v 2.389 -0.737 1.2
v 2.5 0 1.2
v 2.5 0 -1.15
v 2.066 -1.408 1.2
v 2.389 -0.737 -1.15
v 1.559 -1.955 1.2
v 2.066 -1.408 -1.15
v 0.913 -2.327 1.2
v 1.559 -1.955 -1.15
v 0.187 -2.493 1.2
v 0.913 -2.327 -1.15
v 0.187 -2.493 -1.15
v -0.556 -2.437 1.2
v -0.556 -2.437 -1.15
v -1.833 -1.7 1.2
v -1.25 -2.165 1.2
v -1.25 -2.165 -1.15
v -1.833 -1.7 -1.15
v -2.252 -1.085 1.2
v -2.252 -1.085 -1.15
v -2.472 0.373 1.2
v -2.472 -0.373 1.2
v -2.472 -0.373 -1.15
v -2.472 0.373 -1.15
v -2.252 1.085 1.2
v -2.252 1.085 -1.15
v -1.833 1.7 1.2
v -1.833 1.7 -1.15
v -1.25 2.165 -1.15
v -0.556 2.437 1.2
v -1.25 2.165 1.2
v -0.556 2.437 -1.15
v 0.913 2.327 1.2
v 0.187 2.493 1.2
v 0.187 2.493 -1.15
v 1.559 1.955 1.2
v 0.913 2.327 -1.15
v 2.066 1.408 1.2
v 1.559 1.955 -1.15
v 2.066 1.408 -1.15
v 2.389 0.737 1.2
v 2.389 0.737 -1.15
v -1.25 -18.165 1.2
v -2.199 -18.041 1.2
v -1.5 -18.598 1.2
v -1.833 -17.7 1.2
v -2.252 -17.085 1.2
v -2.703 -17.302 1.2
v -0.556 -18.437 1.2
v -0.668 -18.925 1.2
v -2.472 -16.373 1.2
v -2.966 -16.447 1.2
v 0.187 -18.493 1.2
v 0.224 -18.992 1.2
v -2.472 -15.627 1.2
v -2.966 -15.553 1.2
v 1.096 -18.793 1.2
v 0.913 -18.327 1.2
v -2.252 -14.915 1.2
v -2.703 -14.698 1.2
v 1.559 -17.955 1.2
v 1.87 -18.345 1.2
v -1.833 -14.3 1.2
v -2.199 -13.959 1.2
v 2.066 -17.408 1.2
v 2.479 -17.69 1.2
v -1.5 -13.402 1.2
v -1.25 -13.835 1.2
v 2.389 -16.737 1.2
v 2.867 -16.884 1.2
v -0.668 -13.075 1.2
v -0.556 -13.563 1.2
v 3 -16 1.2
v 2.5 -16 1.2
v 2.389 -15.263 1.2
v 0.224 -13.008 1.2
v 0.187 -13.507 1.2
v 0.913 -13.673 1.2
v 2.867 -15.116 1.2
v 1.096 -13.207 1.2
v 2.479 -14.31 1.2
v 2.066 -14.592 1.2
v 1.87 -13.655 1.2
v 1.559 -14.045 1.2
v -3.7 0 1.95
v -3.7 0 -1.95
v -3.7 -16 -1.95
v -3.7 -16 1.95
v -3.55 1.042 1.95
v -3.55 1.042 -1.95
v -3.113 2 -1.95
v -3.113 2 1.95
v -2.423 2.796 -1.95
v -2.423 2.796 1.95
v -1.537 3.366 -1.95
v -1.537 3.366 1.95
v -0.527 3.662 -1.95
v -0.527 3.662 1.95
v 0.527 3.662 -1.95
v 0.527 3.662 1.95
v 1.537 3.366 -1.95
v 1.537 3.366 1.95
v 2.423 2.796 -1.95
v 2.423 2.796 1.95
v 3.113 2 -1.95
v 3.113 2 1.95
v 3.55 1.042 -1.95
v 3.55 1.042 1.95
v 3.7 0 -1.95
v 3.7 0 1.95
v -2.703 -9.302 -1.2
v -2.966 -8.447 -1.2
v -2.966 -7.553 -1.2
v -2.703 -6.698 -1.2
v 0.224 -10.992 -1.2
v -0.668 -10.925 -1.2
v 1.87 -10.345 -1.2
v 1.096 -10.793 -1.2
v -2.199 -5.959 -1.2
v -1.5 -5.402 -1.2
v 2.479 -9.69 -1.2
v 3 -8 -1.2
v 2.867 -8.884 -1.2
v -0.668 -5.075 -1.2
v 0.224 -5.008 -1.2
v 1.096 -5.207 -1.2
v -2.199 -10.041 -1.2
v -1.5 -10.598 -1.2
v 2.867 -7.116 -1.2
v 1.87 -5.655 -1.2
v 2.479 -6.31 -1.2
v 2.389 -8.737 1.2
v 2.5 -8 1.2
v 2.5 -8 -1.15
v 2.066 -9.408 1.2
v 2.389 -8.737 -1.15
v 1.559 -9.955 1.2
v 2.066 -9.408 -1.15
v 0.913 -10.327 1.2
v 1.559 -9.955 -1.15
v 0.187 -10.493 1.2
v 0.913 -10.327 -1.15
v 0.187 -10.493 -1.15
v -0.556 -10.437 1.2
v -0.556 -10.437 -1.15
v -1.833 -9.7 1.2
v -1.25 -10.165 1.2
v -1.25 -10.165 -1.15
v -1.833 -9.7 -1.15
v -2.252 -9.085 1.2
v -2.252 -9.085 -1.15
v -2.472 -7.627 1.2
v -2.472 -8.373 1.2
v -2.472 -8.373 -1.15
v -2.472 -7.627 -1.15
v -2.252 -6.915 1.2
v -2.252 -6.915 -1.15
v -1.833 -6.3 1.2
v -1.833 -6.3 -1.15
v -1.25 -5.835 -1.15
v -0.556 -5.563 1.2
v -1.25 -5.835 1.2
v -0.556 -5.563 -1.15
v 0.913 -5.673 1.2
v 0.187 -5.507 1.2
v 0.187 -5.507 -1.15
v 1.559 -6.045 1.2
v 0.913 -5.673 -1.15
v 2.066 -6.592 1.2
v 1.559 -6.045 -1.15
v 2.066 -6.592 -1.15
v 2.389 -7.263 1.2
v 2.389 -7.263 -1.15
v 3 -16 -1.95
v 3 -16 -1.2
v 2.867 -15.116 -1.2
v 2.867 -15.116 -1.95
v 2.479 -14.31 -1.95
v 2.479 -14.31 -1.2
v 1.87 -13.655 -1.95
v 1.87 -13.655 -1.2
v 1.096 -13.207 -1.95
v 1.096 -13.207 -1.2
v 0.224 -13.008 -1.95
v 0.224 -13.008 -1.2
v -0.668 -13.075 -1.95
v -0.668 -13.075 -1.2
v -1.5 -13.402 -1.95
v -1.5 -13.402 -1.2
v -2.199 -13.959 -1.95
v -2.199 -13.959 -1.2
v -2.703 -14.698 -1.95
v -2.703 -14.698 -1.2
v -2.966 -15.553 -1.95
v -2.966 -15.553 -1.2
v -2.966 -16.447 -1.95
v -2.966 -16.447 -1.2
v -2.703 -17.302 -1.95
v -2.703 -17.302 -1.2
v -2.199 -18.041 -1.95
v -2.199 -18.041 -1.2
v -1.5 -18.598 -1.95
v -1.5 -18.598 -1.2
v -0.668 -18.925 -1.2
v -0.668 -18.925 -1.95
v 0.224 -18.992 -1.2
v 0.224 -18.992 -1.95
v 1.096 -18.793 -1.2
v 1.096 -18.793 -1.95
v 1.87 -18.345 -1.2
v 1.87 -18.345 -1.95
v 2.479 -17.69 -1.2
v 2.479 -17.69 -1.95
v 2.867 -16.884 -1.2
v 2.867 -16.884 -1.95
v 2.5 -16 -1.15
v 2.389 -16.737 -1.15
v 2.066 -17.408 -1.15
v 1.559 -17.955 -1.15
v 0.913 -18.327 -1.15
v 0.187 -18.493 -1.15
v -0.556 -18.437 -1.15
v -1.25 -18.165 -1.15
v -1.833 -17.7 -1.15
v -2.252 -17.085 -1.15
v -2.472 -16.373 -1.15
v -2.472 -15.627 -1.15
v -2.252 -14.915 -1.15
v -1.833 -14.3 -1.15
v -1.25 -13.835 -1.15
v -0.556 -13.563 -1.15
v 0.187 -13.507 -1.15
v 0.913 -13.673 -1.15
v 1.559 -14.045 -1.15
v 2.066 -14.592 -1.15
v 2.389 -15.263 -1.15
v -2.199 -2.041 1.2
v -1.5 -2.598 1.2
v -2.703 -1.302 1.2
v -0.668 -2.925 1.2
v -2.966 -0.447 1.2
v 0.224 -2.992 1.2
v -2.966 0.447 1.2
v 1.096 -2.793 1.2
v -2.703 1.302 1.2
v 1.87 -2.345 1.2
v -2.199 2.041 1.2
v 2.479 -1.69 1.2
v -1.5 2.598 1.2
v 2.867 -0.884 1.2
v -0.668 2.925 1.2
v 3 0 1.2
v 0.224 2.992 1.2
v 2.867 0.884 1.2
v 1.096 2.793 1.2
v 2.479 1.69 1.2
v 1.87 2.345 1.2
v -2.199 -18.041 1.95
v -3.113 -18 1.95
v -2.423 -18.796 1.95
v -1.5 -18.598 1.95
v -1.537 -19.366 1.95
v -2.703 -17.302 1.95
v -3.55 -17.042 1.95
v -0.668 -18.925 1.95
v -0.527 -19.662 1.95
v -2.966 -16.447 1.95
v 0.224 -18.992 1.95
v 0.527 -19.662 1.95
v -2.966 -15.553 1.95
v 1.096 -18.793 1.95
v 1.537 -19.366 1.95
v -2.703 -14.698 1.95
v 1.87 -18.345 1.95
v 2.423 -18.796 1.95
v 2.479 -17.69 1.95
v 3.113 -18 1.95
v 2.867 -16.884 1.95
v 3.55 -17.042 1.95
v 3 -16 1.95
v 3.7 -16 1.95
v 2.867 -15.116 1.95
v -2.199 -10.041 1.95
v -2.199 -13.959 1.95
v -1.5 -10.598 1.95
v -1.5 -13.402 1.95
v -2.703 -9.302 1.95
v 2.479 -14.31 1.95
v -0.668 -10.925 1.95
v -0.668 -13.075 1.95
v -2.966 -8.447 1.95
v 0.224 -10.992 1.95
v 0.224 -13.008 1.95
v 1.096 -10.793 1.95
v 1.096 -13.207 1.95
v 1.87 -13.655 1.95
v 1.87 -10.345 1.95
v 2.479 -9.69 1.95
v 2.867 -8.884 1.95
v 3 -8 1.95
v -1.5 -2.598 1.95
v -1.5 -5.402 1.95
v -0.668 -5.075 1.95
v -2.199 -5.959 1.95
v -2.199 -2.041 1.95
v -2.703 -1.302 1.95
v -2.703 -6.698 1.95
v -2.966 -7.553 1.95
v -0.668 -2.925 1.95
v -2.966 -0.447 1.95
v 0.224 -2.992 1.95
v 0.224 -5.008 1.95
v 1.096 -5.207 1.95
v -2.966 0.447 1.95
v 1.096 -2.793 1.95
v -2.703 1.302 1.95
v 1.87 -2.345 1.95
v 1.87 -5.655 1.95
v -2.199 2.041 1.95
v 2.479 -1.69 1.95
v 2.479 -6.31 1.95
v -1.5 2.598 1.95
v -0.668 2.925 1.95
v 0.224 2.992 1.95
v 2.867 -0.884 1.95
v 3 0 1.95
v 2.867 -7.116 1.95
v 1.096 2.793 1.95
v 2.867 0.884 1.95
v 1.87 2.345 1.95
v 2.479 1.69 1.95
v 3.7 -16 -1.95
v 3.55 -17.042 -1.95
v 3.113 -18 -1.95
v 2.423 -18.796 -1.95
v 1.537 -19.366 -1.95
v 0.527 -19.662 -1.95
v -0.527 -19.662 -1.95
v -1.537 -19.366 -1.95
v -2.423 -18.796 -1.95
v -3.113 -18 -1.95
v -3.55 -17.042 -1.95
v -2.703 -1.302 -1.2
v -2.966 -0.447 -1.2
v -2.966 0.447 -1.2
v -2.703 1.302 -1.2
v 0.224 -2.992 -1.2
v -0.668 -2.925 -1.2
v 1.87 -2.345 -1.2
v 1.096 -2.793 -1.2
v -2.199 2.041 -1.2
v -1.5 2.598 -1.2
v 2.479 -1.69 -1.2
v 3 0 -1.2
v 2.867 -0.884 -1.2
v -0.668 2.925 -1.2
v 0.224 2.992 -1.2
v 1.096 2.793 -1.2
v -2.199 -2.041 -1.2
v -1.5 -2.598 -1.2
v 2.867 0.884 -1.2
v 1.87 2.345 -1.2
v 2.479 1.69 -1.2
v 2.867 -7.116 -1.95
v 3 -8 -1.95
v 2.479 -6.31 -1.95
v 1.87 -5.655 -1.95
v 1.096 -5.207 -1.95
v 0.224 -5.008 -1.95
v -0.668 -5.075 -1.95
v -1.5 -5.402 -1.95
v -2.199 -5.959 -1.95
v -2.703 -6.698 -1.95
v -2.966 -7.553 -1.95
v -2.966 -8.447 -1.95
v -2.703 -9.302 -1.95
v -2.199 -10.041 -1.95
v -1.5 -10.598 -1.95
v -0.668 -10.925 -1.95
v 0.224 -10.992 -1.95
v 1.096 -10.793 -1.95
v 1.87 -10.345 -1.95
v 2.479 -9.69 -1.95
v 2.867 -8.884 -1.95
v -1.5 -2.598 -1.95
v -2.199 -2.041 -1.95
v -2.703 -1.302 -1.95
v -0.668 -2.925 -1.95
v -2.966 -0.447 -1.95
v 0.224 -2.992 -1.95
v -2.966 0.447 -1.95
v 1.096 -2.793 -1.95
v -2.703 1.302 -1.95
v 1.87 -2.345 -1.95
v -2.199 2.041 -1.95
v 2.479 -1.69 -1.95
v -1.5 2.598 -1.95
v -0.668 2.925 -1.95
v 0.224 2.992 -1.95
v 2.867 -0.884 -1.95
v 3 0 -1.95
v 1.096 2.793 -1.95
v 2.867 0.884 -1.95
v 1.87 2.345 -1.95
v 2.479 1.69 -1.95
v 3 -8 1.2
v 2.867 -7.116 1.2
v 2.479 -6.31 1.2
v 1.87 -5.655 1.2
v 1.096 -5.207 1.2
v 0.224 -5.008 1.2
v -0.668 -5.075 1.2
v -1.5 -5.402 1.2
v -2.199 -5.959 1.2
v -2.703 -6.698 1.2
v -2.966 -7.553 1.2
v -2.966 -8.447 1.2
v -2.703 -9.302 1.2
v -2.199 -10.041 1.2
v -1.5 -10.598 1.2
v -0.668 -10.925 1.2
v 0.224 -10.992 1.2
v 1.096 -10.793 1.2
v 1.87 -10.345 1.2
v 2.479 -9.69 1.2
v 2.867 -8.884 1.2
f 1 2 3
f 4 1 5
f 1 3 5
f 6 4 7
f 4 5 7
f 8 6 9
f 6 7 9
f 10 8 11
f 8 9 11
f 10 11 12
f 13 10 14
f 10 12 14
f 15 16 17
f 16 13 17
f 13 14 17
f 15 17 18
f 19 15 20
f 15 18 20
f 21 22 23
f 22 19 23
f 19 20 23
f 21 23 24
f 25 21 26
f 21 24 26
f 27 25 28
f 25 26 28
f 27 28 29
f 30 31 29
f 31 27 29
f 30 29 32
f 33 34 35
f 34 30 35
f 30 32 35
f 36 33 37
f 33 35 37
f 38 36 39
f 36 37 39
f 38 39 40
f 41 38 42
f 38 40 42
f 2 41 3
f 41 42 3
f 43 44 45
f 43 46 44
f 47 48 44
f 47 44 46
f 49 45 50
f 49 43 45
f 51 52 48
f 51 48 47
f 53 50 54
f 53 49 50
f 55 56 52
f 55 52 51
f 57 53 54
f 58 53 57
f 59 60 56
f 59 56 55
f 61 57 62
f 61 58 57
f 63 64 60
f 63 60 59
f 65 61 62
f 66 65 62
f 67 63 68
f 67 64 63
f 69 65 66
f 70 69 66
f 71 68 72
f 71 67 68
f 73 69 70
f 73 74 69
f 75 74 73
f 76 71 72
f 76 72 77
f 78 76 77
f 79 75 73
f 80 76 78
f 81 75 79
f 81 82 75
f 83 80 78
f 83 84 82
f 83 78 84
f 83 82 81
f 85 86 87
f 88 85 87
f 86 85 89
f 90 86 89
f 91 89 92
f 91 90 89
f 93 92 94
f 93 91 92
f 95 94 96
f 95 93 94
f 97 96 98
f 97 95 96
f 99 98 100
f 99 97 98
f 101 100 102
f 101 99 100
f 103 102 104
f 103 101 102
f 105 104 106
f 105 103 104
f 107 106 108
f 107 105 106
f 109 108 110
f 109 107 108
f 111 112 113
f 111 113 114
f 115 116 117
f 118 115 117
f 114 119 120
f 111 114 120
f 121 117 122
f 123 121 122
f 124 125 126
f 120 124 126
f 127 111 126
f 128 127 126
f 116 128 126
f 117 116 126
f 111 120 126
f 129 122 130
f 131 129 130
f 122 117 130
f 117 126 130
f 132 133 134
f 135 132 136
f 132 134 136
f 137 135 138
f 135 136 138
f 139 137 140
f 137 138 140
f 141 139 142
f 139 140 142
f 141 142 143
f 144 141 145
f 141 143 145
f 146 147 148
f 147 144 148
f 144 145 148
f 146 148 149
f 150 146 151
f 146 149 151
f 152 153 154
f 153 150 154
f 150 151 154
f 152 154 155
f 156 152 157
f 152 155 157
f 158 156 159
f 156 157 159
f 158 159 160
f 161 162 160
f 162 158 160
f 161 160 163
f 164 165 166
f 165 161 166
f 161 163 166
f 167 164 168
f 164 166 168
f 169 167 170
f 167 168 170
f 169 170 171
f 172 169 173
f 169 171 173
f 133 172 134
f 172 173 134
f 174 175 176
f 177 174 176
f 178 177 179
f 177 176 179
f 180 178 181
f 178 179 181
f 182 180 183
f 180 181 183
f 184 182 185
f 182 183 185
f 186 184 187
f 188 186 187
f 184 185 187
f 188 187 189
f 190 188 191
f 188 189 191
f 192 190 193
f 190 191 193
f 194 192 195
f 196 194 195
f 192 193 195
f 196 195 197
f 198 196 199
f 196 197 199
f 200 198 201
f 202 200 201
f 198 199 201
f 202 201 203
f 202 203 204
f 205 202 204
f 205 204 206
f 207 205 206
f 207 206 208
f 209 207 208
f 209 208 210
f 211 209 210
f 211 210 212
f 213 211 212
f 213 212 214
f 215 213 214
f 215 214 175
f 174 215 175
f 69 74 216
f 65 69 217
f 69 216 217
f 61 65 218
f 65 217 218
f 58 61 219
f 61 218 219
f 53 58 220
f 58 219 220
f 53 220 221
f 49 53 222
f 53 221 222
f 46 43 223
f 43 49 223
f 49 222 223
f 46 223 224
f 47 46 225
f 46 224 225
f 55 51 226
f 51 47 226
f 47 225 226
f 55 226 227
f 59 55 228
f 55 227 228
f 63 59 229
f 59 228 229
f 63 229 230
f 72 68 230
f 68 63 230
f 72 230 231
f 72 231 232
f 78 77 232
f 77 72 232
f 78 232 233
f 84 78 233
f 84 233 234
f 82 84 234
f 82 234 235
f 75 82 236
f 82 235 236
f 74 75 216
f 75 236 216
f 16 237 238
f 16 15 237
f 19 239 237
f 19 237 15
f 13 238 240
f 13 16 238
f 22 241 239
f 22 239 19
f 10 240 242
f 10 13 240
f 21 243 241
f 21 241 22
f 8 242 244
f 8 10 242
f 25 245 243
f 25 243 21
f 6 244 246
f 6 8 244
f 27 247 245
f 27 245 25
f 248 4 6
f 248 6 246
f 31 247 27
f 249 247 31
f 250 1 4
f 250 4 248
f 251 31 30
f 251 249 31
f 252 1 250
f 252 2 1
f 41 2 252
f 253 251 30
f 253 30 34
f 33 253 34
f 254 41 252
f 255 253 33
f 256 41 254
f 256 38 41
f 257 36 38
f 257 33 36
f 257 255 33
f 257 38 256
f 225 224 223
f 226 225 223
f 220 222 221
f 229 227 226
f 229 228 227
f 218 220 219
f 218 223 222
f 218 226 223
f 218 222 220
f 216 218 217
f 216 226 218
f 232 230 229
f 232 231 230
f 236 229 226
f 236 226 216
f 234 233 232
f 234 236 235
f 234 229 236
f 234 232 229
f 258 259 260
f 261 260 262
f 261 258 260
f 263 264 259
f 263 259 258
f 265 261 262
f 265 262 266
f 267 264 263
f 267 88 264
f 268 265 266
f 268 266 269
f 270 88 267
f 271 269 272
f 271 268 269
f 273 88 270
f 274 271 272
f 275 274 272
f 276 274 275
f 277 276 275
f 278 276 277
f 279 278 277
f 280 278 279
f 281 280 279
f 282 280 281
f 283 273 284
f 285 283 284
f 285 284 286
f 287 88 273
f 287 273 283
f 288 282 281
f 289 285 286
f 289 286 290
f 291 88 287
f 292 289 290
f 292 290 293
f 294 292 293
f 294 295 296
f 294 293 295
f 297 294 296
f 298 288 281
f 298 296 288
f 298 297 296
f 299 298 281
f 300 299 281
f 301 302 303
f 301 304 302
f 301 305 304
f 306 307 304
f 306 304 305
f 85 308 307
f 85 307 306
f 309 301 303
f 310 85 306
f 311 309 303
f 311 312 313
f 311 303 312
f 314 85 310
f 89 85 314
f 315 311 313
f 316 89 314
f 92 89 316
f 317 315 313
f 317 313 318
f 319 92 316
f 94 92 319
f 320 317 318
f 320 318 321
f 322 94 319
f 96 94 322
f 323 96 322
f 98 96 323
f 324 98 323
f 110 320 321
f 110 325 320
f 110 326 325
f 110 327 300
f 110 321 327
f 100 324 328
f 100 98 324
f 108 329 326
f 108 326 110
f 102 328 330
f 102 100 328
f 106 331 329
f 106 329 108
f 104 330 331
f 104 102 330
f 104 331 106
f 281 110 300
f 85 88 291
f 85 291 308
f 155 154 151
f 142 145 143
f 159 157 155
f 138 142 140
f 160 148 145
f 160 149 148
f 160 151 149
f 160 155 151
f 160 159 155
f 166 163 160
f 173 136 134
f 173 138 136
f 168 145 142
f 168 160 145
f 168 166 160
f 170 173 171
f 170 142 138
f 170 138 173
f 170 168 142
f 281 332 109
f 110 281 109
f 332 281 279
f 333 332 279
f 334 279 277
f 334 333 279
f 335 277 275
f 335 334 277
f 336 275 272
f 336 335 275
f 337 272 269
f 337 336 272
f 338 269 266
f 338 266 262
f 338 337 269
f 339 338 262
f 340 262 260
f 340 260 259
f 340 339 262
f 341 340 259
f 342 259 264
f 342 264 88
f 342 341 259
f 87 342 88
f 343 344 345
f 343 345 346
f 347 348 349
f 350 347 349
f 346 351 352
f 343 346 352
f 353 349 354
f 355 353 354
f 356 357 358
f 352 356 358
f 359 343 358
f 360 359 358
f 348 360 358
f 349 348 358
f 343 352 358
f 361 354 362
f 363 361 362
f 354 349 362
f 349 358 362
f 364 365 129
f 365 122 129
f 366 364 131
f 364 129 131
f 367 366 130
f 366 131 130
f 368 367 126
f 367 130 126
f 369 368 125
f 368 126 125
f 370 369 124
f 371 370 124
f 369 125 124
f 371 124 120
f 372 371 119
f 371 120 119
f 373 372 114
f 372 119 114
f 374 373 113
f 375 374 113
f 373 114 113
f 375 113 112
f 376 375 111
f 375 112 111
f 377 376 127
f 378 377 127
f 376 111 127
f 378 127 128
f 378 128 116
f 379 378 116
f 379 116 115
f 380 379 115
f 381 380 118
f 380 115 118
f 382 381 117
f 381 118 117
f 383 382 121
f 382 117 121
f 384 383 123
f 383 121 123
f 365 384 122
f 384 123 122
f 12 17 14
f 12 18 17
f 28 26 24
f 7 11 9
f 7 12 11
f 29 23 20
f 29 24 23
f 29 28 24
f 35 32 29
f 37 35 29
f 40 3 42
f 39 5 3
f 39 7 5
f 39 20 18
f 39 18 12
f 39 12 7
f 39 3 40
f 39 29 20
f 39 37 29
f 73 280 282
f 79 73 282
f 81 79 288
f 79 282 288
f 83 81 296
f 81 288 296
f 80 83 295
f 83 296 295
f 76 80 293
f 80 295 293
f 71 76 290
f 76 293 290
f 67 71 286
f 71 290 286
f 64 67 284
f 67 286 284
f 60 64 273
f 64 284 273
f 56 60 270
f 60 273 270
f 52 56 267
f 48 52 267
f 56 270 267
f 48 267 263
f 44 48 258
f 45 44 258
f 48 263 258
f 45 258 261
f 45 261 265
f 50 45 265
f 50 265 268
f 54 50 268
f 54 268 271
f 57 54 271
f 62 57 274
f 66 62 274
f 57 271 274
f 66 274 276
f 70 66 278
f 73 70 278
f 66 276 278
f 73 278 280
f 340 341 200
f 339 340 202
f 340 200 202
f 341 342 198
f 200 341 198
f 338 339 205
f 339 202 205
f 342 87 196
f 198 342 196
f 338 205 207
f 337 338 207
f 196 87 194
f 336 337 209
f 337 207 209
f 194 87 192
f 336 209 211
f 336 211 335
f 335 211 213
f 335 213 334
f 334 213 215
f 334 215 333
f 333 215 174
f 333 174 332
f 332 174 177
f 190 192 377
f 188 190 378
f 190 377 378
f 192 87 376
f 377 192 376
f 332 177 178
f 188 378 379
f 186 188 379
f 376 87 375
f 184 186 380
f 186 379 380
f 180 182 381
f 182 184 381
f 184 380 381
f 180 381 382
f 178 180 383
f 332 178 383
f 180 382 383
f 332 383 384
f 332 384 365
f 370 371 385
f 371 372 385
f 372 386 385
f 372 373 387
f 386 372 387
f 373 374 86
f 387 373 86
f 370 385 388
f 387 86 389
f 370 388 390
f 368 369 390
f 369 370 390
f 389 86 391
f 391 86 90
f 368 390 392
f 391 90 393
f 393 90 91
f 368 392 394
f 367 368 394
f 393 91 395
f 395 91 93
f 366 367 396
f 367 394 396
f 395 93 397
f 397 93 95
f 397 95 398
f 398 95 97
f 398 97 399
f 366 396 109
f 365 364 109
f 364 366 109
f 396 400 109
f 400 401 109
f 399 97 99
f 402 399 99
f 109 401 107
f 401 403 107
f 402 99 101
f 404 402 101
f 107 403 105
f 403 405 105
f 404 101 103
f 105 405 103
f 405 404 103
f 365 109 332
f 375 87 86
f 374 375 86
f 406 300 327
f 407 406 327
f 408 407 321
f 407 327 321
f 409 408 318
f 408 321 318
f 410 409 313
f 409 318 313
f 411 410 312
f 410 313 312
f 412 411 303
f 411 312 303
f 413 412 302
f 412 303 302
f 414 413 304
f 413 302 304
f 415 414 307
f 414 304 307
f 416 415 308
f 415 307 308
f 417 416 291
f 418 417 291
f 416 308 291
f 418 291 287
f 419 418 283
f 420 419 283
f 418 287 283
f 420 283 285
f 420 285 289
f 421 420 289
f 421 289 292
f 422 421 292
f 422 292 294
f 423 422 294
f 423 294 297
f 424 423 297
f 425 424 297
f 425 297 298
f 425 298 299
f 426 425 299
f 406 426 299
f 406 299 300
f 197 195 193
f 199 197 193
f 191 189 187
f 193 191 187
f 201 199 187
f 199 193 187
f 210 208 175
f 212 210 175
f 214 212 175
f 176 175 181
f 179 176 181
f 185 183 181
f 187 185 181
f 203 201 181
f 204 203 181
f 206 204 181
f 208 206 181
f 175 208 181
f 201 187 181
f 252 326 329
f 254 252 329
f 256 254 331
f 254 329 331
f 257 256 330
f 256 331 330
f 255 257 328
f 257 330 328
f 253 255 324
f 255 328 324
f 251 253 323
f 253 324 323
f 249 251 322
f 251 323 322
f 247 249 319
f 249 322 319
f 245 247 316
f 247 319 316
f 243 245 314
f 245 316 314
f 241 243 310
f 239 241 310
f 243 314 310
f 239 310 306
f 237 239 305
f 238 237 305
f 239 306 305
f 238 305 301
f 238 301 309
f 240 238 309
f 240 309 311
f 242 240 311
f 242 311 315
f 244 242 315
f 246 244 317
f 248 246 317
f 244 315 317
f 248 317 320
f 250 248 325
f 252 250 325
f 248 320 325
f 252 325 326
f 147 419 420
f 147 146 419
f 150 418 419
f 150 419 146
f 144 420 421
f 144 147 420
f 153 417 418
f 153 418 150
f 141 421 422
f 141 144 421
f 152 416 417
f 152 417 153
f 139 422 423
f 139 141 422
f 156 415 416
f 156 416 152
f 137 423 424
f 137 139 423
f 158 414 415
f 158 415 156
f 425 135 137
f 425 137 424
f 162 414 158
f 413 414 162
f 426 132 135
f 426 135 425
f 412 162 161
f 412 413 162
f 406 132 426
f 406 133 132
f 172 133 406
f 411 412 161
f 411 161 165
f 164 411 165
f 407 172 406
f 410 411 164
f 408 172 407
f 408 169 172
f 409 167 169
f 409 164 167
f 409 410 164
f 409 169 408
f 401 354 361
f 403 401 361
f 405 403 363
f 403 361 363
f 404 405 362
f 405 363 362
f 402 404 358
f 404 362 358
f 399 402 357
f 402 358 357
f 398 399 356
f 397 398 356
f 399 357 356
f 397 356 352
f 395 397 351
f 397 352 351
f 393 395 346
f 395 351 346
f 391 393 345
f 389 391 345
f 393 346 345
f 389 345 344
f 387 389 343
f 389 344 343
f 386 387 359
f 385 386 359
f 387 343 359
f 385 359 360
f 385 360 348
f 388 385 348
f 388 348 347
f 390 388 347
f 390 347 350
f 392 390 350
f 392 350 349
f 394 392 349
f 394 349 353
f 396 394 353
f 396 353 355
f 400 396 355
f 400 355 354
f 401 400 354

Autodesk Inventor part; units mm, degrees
ref_plane "YZ Plane" through (0, 0, 0) normal (1, 0, 0) x (0, 1, 0)
ref_plane "XZ Plane" through (0, 0, 0) normal (0, 1, 0) x (-1, 0, 0)
sketch "Sketch1" plane through (0, 0, 0) normal (0, 0, 1) x (1, 0, 0)
  line L0 (0, 0) -> (1.6, 0) construction
  circle A0 centre (0, 0) radius 2.5
  circle A1 centre (0, 0) radius 3
  arc A2 (0, 3.7) -> (-3.7, 0) centre (0, 0) ccw
  line L1 (0, 0) -> (0, 3.7) construction
  line L2 (0, 3.7) -> (0, 3.7)
  arc A3 (3.7, 0) -> (0, 3.7) centre (0, 0) ccw
  line L3 (0, 0) -> (0, 0) construction
  line L4 (0, 0) -> (-3.7, 0) construction
  line L5 (-3.7, 0) -> (-3.7, -16)
  arc A4 (-3.7, -16) -> (0, -19.7) centre (0, -16) ccw
  line L6 (0, -19.7) -> (0, -19.7)
  arc A5 (0, -19.7) -> (3.7, -16) centre (0, -16) ccw
  line L7 (3.7, -16) -> (3.7, 0)
  dimension "x" = 1.6
  dimension "d1" = 5
  dimension "d2" = 6
  dimension "d3" = 3.7
  dimension "d4" = 0
  dimension "d17" = 16
extrude "Extrusion1" add sketch "Sketch1" along normal mid plane 3.9 contours A0 | A1 | A3 L7 A5 A4 L5 A2
extrude "Extrusion2" cut sketch "Sketch1" against normal up to surface (3.9 mm away) from surface at 1.95 contours A0 | A1
extrude "Extrusion3" add sketch "Sketch1" along normal mid plane 2.4 contours A1
pattern_linear "Rectangular Pattern1" count 3 spacing -8 along (0, 1, 0) of "Extrusion2", "Extrusion3"
ref_plane "Work Plane1" through (0, 0, -1.15) normal (0, 0, -1) x (-1, 0, 0)
extrude "Extrusion4" add sketch "Sketch1" along normal up to surface (0.05 mm away) from surface at -1.2 contours A0 | A1 | A3 L7 A5 A4 L5 A2
equation "\"d13\" = 5 * x"
equation "\"d20\" = -5 * x"
properties part number "LEGO technic thin liftarm"
